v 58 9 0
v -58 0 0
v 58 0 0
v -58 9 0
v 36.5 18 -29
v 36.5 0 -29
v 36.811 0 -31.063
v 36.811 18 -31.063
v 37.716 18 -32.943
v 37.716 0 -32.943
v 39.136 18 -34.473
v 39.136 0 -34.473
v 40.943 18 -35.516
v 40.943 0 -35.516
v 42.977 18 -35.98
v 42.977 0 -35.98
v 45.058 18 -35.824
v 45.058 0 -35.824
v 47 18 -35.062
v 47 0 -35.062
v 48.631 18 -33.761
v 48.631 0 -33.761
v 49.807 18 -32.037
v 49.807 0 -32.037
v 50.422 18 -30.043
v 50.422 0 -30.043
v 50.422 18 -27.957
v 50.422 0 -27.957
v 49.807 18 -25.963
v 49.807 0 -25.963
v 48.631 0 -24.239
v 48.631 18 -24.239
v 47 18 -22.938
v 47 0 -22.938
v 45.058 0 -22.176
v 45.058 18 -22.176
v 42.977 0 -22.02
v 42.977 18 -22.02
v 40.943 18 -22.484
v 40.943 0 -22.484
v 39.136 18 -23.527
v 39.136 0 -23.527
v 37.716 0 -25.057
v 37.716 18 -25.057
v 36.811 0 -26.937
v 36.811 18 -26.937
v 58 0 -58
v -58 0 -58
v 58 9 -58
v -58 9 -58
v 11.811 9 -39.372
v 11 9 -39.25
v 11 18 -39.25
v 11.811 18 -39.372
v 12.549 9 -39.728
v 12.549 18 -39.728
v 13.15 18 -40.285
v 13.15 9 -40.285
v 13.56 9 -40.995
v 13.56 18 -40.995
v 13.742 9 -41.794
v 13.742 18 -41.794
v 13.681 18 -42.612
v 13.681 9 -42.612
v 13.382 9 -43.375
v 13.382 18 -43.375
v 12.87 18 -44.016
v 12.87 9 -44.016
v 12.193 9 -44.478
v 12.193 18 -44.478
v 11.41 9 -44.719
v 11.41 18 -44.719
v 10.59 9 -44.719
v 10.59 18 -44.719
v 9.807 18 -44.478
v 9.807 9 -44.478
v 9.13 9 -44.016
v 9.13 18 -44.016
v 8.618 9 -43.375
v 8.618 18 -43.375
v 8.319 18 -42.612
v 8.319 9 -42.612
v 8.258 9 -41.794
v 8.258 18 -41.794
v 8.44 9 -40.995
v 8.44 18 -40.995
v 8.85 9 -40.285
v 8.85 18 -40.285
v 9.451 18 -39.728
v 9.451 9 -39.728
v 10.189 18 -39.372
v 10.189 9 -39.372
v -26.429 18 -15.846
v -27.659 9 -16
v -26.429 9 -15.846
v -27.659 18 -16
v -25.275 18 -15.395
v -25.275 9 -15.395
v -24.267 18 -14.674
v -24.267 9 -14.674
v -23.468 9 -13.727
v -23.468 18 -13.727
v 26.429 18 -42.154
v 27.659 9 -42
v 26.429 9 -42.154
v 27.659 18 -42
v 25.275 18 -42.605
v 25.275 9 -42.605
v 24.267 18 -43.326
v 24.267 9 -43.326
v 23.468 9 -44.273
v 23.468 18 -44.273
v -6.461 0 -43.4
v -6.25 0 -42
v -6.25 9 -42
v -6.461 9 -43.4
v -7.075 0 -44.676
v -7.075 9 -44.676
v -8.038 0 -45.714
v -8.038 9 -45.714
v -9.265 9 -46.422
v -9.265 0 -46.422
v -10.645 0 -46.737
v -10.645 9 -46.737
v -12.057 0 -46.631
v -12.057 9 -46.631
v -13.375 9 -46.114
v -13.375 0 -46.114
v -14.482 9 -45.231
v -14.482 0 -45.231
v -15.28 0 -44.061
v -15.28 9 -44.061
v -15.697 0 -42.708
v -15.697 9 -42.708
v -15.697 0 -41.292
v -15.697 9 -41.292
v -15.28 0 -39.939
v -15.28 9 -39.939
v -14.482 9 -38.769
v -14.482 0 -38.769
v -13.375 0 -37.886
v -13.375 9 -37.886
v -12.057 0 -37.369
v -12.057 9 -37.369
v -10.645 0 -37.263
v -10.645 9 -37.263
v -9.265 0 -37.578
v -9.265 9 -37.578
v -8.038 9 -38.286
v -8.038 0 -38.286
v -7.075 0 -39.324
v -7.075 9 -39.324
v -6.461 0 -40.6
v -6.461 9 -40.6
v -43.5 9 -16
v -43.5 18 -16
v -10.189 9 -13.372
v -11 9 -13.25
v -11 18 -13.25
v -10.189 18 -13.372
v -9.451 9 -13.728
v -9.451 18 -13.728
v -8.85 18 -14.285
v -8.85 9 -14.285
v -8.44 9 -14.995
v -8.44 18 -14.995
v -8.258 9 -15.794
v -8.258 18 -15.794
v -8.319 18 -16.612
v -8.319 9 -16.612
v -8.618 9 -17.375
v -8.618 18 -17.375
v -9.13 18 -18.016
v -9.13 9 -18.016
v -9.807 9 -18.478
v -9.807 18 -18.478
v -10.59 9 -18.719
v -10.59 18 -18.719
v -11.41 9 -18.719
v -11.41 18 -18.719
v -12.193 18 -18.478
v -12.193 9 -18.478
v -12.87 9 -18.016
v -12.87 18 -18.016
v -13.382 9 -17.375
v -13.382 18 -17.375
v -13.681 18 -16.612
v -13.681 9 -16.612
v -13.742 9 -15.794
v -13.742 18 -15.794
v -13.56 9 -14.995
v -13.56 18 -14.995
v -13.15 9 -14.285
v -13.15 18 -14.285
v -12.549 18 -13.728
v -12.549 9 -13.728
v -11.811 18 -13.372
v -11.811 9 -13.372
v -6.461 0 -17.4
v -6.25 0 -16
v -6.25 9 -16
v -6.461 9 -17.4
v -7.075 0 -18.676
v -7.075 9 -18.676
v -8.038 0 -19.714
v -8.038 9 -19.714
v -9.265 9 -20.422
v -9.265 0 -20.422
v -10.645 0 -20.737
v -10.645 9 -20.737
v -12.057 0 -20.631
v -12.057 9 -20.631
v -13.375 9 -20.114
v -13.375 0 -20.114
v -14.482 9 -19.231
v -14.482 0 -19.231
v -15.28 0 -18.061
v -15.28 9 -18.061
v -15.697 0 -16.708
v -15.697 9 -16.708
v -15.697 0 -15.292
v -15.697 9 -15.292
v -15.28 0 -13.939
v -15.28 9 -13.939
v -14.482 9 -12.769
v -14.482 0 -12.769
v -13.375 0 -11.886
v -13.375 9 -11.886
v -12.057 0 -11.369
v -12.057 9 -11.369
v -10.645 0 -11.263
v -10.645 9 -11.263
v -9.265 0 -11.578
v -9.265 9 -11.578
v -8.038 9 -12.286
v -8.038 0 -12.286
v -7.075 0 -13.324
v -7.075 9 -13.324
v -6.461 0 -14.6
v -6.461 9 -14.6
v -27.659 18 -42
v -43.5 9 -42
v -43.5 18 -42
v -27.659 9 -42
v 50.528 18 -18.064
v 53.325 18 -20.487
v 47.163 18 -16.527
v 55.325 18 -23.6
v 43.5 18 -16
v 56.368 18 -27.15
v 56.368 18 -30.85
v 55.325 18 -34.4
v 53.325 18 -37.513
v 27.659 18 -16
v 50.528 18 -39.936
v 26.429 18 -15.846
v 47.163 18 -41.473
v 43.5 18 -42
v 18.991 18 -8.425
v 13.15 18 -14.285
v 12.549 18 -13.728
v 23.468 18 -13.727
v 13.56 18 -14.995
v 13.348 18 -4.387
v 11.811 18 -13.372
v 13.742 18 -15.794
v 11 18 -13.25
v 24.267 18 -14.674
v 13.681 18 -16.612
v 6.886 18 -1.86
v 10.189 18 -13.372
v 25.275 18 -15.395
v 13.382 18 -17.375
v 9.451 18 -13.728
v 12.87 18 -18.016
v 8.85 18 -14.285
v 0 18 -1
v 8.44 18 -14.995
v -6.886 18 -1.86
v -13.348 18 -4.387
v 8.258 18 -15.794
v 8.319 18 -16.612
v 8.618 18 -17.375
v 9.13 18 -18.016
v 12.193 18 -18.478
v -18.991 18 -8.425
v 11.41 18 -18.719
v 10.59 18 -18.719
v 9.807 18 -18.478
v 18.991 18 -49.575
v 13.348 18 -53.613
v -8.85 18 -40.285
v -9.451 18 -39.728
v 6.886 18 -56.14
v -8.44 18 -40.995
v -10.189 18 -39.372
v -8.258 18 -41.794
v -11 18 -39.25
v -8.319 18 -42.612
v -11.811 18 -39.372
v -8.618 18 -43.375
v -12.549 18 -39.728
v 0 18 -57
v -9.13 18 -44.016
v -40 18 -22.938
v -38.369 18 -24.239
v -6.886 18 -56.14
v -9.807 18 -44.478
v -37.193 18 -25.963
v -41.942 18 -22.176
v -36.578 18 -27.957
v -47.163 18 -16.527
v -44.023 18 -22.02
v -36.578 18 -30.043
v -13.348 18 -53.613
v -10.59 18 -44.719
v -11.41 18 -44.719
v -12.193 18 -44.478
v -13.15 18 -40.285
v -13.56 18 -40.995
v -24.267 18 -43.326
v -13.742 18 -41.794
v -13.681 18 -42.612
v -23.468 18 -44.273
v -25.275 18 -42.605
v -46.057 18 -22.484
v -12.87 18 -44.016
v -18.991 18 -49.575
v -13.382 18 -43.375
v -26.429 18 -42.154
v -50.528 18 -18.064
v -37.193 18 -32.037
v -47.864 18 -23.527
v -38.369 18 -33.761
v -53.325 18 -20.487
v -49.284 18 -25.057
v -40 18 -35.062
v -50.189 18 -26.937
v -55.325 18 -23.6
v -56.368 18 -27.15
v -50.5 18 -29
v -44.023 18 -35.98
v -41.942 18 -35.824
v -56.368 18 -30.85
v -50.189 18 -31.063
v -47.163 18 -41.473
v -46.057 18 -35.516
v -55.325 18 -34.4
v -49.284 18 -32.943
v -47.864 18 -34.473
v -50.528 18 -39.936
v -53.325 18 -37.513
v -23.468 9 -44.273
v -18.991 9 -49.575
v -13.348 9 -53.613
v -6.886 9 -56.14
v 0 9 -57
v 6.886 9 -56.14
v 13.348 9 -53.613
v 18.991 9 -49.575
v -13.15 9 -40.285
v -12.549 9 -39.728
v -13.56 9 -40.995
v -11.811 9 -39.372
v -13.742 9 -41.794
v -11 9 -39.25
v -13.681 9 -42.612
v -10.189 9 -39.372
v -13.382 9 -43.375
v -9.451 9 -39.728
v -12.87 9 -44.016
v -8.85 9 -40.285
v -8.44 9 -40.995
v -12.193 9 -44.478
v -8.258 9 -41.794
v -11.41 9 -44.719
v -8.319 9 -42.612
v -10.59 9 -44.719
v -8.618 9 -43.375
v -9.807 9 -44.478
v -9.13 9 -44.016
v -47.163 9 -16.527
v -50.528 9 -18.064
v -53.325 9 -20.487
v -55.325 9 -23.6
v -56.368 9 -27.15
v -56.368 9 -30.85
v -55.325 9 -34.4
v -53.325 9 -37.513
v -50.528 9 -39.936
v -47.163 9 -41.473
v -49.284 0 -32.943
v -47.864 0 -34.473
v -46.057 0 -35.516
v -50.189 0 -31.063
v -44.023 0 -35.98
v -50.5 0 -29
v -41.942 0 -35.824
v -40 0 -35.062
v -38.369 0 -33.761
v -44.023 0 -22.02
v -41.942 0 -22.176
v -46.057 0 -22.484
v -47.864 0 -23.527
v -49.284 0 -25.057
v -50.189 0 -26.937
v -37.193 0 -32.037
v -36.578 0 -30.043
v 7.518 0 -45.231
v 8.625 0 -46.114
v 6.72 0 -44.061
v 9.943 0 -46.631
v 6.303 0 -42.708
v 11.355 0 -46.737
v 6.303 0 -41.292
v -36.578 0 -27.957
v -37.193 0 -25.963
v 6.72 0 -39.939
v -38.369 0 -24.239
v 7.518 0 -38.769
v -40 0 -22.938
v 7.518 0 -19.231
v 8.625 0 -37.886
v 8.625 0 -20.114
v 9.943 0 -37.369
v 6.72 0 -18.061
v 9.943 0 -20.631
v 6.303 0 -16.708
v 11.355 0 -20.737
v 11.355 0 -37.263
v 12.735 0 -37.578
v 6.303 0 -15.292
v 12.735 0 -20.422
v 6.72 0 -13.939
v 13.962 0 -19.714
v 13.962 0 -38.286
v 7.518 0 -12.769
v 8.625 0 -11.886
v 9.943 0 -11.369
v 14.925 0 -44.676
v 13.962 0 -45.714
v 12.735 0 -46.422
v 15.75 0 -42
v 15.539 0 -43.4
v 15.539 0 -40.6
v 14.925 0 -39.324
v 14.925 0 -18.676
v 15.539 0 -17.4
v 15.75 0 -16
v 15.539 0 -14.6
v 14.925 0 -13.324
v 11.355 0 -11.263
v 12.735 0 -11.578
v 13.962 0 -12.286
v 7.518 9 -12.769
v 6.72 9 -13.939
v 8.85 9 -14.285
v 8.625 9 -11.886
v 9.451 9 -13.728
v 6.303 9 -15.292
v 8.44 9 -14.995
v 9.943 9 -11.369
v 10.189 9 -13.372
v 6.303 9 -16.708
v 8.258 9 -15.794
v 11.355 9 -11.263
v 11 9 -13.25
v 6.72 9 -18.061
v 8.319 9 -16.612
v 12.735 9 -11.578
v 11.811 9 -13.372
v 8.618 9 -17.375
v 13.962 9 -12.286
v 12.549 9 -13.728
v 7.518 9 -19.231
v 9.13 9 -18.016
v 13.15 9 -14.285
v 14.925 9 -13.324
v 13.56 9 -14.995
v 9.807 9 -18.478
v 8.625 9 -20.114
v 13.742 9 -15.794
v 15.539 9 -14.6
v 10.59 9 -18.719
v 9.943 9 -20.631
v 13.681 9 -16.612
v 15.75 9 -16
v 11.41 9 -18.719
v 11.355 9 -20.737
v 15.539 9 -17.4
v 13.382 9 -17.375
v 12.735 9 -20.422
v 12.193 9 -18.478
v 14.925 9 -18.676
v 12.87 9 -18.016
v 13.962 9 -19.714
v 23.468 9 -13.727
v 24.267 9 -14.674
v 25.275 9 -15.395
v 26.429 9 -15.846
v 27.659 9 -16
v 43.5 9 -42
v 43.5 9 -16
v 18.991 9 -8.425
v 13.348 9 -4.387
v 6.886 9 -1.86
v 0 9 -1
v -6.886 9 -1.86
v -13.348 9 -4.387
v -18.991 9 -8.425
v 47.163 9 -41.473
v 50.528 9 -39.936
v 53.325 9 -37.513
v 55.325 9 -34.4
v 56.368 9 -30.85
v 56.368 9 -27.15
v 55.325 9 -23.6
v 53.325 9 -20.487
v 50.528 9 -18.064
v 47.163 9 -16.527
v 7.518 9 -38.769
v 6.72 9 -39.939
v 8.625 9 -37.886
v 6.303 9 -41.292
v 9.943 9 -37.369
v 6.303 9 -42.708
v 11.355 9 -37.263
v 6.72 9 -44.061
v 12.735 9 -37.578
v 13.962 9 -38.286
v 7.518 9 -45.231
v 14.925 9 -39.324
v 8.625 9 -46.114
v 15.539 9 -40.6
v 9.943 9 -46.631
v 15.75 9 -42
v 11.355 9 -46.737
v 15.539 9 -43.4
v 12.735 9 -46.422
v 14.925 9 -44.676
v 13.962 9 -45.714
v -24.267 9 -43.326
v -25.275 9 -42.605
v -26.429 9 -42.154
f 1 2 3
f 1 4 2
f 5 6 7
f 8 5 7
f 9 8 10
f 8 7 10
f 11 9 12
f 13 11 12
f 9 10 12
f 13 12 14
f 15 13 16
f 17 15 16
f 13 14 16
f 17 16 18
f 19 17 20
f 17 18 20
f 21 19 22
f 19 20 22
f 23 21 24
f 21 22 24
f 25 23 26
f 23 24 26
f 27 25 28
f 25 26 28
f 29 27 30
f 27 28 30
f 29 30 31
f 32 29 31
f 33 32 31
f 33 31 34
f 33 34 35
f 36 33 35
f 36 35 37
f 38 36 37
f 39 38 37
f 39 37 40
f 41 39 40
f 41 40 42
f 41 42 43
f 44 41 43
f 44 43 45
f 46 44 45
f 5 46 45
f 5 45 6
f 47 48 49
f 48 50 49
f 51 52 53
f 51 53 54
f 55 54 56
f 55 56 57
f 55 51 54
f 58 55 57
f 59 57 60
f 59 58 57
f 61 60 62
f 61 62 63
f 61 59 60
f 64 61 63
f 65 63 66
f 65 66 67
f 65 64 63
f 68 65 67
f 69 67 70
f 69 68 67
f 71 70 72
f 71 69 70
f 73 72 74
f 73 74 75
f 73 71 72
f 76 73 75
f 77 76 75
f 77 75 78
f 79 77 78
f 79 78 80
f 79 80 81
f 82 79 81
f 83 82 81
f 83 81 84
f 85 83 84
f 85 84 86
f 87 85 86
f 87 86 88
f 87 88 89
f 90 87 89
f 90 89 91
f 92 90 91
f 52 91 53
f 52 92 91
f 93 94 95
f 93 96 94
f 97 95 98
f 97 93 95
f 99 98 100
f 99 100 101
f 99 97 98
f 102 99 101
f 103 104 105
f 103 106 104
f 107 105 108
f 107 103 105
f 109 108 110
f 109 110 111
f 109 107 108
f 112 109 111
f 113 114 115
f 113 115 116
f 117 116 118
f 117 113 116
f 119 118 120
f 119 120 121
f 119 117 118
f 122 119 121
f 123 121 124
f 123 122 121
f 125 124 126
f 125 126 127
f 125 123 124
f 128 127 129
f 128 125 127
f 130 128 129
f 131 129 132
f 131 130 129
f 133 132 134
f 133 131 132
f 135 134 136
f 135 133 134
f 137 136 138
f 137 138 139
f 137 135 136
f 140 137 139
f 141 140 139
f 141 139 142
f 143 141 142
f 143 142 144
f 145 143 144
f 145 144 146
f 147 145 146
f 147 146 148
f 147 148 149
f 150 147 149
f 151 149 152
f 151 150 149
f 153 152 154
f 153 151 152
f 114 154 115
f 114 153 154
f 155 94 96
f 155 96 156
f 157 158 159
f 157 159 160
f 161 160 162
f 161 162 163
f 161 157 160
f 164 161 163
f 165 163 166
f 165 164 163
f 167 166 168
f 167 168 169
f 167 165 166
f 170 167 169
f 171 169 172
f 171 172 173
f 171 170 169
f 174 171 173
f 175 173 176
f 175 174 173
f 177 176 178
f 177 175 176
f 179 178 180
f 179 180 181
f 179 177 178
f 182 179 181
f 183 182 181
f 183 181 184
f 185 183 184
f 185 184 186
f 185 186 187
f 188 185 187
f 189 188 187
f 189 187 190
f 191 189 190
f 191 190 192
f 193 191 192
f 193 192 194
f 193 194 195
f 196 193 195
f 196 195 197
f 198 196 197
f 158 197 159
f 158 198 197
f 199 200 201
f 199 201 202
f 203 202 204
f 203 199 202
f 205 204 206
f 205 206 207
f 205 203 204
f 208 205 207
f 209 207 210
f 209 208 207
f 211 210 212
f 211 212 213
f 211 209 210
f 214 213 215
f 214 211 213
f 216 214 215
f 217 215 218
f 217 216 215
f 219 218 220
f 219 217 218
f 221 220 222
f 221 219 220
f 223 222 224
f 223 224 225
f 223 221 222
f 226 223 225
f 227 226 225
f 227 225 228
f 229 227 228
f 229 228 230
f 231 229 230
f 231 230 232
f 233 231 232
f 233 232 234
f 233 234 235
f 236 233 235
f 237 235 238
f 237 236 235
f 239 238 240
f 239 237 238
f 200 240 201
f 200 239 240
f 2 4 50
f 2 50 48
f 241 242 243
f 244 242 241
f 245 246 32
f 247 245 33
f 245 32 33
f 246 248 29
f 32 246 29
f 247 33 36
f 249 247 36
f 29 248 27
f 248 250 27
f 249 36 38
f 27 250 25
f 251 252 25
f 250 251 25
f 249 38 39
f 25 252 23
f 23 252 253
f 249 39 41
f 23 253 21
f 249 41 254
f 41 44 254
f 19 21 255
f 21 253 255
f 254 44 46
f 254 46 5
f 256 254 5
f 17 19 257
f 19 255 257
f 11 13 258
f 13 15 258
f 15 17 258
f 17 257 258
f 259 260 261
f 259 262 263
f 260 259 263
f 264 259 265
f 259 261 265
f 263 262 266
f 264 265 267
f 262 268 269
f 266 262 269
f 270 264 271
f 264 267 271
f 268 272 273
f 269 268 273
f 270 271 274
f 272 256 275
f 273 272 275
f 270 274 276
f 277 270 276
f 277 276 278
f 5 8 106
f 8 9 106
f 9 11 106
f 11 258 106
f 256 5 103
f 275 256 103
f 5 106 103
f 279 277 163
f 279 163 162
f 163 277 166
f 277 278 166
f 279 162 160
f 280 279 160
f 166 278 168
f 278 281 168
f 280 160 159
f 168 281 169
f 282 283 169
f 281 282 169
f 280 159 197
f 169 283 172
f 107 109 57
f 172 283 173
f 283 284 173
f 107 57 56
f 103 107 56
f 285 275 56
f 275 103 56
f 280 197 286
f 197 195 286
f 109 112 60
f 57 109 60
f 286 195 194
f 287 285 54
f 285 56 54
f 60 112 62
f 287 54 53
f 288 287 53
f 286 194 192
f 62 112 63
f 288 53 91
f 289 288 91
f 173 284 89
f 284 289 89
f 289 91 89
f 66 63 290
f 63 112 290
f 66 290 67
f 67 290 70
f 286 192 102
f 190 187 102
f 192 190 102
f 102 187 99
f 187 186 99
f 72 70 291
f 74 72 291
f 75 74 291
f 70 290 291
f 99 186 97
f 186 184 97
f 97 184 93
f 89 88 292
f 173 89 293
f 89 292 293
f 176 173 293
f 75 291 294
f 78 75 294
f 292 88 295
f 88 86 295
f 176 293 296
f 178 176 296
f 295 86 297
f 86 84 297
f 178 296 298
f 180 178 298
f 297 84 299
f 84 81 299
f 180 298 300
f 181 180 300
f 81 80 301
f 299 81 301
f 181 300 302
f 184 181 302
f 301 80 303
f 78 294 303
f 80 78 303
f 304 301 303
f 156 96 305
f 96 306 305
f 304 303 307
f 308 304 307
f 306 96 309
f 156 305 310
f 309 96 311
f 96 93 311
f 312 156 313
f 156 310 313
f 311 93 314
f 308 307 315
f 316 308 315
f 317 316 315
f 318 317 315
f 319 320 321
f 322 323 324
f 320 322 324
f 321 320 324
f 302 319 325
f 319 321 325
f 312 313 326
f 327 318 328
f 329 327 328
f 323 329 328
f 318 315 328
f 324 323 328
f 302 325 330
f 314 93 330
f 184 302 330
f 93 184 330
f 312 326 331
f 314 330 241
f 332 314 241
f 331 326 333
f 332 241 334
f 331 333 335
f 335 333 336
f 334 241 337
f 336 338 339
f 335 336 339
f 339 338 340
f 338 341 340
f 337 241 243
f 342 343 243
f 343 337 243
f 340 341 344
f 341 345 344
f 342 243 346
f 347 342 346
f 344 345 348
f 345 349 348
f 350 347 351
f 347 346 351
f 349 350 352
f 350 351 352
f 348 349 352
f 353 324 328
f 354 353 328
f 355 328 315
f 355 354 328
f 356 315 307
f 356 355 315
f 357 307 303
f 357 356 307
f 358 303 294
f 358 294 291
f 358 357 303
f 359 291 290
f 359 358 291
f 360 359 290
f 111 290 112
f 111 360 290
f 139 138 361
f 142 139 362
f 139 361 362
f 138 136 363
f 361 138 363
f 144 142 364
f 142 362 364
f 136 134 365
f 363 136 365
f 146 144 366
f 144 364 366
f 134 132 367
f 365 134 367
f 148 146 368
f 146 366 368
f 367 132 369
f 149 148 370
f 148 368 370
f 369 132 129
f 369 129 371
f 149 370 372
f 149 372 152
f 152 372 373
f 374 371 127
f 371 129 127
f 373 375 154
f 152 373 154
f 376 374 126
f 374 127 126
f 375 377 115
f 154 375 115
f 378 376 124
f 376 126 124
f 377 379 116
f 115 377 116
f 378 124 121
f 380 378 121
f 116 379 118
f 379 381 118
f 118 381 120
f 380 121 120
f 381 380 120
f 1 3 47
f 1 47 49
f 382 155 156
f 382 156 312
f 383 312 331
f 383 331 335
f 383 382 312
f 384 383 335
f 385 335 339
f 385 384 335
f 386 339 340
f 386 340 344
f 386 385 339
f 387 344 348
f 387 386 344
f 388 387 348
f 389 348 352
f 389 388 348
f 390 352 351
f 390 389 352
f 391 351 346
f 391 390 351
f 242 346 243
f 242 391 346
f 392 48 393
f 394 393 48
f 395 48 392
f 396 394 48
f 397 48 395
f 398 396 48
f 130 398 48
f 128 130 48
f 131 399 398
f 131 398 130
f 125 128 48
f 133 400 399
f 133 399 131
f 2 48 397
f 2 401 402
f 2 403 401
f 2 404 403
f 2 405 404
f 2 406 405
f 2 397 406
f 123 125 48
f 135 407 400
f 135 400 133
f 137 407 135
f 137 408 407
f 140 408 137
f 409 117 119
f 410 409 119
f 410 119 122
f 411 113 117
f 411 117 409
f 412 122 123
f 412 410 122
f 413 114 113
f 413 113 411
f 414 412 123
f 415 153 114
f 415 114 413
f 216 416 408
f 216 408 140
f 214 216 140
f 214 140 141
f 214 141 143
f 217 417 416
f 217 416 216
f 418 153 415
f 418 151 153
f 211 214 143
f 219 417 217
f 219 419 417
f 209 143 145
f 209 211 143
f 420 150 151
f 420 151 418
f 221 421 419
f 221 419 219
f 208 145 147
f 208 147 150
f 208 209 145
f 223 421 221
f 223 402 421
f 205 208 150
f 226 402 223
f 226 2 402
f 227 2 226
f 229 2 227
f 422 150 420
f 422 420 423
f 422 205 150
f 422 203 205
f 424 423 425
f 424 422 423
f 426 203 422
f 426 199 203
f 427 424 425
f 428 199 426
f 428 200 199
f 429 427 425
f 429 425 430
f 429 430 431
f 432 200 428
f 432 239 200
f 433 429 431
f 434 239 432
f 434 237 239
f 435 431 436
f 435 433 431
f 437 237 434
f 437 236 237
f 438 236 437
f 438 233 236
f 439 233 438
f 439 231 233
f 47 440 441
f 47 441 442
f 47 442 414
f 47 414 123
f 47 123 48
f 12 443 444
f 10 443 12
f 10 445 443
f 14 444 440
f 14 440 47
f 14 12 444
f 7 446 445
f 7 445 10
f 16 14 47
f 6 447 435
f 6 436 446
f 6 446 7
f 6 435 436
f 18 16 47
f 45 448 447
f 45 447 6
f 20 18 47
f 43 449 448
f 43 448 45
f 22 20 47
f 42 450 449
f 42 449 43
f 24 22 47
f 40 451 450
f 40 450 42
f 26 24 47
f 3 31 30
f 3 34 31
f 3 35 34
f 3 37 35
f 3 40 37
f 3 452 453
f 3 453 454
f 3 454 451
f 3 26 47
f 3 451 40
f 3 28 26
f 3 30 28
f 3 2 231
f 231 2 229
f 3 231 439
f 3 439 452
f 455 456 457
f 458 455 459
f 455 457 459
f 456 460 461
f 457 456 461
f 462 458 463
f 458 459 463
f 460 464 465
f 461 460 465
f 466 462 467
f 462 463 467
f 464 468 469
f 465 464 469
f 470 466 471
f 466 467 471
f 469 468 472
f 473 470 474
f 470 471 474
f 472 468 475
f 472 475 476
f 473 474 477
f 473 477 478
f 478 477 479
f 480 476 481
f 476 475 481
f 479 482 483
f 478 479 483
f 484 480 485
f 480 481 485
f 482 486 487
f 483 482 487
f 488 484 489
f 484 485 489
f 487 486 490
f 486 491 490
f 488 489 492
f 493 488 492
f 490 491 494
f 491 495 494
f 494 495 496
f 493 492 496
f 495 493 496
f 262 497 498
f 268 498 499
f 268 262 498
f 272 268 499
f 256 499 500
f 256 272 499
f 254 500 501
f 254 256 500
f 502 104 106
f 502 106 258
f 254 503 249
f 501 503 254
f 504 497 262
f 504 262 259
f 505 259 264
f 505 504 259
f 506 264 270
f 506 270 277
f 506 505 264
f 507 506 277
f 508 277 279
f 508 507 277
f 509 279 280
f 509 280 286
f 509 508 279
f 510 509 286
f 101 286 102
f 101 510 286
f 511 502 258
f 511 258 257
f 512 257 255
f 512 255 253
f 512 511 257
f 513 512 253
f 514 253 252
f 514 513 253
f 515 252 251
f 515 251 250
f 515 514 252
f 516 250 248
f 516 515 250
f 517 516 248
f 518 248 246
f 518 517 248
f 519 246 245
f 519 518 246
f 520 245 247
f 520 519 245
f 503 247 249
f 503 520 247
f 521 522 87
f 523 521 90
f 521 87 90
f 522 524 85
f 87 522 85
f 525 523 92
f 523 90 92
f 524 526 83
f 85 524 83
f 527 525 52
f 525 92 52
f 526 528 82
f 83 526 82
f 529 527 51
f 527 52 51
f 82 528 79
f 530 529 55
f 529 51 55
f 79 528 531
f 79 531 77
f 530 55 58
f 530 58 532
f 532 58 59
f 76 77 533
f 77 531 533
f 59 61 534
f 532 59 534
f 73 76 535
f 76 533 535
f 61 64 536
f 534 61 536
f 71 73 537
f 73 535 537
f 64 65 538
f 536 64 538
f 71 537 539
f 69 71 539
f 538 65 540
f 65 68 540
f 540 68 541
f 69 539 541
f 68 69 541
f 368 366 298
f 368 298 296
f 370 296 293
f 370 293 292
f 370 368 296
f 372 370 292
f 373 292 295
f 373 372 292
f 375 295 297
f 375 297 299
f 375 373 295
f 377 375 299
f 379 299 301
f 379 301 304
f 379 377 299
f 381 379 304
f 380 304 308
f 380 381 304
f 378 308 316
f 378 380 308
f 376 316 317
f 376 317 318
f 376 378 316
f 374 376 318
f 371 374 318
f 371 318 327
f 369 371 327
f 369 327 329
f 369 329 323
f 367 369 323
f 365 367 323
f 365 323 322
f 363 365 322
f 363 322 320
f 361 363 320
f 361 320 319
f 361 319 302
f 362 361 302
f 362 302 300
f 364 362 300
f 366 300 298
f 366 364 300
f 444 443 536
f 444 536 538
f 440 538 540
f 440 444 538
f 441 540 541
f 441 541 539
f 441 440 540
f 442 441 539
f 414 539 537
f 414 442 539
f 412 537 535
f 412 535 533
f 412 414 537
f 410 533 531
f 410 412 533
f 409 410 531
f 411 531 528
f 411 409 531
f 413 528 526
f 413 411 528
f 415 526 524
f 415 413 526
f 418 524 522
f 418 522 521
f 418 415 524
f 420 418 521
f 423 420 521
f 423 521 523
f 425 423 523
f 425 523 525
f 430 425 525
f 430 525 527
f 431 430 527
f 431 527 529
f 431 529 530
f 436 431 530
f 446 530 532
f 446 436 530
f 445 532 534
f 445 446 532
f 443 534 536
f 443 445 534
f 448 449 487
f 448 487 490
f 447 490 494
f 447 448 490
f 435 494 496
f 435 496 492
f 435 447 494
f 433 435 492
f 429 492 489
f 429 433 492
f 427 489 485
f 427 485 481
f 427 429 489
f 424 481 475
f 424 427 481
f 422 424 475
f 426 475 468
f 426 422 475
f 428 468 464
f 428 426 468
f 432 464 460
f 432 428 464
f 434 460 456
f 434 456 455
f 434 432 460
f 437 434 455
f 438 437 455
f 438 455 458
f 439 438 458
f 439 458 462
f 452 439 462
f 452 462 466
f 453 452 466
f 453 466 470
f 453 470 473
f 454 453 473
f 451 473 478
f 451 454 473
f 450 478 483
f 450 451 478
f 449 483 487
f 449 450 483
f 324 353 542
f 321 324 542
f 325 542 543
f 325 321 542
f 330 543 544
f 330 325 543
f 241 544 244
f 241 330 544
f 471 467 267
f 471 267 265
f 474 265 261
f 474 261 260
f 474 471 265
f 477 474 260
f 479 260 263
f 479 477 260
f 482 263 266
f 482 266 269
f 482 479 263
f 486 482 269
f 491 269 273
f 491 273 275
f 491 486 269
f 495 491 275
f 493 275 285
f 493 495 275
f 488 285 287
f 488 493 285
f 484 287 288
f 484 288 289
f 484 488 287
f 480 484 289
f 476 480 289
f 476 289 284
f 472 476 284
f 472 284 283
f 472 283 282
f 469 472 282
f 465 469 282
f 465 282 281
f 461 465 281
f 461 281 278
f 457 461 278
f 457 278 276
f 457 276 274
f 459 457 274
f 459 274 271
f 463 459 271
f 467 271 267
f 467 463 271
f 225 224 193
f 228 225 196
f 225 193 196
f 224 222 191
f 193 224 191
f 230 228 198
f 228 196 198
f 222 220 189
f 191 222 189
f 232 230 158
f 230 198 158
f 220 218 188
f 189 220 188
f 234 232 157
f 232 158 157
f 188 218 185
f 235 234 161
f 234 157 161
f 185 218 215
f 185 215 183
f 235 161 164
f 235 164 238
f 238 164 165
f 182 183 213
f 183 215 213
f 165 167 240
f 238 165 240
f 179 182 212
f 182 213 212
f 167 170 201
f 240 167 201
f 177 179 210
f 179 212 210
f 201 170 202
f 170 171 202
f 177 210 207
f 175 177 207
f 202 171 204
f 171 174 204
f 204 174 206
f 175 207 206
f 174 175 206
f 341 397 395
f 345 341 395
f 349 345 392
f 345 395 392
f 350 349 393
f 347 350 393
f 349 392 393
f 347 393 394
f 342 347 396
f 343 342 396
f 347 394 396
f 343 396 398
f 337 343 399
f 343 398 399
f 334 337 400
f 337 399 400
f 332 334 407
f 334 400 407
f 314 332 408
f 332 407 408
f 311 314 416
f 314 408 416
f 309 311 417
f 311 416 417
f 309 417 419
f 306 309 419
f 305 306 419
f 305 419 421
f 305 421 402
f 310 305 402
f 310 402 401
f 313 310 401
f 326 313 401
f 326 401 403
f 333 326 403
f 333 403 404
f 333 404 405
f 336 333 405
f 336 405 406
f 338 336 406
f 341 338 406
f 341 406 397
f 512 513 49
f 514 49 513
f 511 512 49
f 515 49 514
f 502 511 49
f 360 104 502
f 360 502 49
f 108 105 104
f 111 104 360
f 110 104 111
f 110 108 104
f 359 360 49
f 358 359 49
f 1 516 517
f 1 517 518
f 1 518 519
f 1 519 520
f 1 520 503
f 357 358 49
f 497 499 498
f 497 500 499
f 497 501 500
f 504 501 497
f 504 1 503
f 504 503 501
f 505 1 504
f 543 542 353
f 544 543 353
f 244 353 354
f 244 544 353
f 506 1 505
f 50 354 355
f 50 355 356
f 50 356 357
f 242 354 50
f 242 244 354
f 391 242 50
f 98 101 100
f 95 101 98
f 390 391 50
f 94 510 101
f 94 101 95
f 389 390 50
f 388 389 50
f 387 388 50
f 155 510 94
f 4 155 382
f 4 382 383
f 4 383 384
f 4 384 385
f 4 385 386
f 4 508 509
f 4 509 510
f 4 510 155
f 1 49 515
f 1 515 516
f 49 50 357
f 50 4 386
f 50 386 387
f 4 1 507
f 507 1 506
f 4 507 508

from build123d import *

# Parameters (mm, degrees)
RESSALTO_EXTRUS_O1_DEPTH     = 58
ESBO_O3_R                    = 2.75
RESSALTO_EXTRUS_O2_DEPTH     = 9
FILETE1_R                    = 5
FURO_DE_DI_METRO_0_15_14_1_D = 14
FUROAVAN_ADO1_OUTLINE_R      = 4.75
FUROAVAN_ADO1_DEPTH          = 9


# Read off the part's stored shape, not the designer's step: FuroAvançado1
with BuildPart() as part:
    # Esboço2 → Ressalto-extrusão1 (new body)
    with BuildSketch(Plane.XY):
        Polygon((-58, 0), (0, 0), (58, 0), (58, 9), (0, 9), (-58, 9), align=None)
    extrude(amount=-RESSALTO_EXTRUS_O1_DEPTH)

    # Esboço3 → Ressalto-extrusão2 (add)
    with BuildSketch(Plane(origin=(0, 9, 0), x_dir=(1, 0, 0), z_dir=(0, 1, 0))):
        with BuildLine():
            Line((-43.5, 42), (-24.799193535, 42))
            ThreePointArc((-24.799193535, 42), (0, 57), (24.799193535, 42))
            Line((24.799193535, 42), (43.5, 42))
            ThreePointArc((43.5, 42), (56.5, 29), (43.5, 16))
            Line((43.5, 16), (24.799193535, 16))
            ThreePointArc((24.799193535, 16), (0, 1), (-24.799193535, 16))
            Line((-24.799193535, 16), (-43.5, 16))
            ThreePointArc((-43.5, 16), (-56.5, 29), (-43.5, 42))
        make_face()
        with Locations(Location((-11, 42, 0), (0, 0, 270))):
            Circle(ESBO_O3_R, mode=Mode.SUBTRACT)
        with Locations(Location((11, 42, 0), (0, 0, 270))):
            Circle(ESBO_O3_R, mode=Mode.SUBTRACT)
        with Locations(Location((-11, 16, 0), (0, 0, 270))):
            Circle(ESBO_O3_R, mode=Mode.SUBTRACT)
        with Locations(Location((11, 16, 0), (0, 0, 270))):
            Circle(ESBO_O3_R, mode=Mode.SUBTRACT)
    extrude(amount=RESSALTO_EXTRUS_O2_DEPTH)

    # Filete1
    filete1_edges = [part.edges().sort_by_distance(p)[0] for p in [
        (24.799193535, 13.5, -42),
        (-24.799193535, 13.5, -42),
        (-24.799193535, 13.5, -16),
        (24.799193535, 13.5, -16),
    ]]
    fillet(filete1_edges, radius=FILETE1_R)

    # Furo de diâmetro Ø0.15 (14)1 (through all)
    with Locations(Plane(origin=(0, 18, 0), x_dir=(1, 0, 0), z_dir=(0, 1, 0))):
        with Locations((-43.5, 29), (43.5, 29)):
            Hole(FURO_DE_DI_METRO_0_15_14_1_D / 2)

    # FuroAvançado1 outline → FuroAvançado1 (cut)
    with BuildSketch(Plane(origin=(0, 0, 0), x_dir=(1, 0, 0), z_dir=(0, 1, 0))):
        with Locations((-11, 42)):
            Circle(FUROAVAN_ADO1_OUTLINE_R)
        with Locations((-11, 16)):
            Circle(FUROAVAN_ADO1_OUTLINE_R)
        with Locations((11, 16)):
            Circle(FUROAVAN_ADO1_OUTLINE_R)
        with Locations((11, 42)):
            Circle(FUROAVAN_ADO1_OUTLINE_R)
    extrude(amount=FUROAVAN_ADO1_DEPTH, mode=Mode.SUBTRACT)


solid = part.part
